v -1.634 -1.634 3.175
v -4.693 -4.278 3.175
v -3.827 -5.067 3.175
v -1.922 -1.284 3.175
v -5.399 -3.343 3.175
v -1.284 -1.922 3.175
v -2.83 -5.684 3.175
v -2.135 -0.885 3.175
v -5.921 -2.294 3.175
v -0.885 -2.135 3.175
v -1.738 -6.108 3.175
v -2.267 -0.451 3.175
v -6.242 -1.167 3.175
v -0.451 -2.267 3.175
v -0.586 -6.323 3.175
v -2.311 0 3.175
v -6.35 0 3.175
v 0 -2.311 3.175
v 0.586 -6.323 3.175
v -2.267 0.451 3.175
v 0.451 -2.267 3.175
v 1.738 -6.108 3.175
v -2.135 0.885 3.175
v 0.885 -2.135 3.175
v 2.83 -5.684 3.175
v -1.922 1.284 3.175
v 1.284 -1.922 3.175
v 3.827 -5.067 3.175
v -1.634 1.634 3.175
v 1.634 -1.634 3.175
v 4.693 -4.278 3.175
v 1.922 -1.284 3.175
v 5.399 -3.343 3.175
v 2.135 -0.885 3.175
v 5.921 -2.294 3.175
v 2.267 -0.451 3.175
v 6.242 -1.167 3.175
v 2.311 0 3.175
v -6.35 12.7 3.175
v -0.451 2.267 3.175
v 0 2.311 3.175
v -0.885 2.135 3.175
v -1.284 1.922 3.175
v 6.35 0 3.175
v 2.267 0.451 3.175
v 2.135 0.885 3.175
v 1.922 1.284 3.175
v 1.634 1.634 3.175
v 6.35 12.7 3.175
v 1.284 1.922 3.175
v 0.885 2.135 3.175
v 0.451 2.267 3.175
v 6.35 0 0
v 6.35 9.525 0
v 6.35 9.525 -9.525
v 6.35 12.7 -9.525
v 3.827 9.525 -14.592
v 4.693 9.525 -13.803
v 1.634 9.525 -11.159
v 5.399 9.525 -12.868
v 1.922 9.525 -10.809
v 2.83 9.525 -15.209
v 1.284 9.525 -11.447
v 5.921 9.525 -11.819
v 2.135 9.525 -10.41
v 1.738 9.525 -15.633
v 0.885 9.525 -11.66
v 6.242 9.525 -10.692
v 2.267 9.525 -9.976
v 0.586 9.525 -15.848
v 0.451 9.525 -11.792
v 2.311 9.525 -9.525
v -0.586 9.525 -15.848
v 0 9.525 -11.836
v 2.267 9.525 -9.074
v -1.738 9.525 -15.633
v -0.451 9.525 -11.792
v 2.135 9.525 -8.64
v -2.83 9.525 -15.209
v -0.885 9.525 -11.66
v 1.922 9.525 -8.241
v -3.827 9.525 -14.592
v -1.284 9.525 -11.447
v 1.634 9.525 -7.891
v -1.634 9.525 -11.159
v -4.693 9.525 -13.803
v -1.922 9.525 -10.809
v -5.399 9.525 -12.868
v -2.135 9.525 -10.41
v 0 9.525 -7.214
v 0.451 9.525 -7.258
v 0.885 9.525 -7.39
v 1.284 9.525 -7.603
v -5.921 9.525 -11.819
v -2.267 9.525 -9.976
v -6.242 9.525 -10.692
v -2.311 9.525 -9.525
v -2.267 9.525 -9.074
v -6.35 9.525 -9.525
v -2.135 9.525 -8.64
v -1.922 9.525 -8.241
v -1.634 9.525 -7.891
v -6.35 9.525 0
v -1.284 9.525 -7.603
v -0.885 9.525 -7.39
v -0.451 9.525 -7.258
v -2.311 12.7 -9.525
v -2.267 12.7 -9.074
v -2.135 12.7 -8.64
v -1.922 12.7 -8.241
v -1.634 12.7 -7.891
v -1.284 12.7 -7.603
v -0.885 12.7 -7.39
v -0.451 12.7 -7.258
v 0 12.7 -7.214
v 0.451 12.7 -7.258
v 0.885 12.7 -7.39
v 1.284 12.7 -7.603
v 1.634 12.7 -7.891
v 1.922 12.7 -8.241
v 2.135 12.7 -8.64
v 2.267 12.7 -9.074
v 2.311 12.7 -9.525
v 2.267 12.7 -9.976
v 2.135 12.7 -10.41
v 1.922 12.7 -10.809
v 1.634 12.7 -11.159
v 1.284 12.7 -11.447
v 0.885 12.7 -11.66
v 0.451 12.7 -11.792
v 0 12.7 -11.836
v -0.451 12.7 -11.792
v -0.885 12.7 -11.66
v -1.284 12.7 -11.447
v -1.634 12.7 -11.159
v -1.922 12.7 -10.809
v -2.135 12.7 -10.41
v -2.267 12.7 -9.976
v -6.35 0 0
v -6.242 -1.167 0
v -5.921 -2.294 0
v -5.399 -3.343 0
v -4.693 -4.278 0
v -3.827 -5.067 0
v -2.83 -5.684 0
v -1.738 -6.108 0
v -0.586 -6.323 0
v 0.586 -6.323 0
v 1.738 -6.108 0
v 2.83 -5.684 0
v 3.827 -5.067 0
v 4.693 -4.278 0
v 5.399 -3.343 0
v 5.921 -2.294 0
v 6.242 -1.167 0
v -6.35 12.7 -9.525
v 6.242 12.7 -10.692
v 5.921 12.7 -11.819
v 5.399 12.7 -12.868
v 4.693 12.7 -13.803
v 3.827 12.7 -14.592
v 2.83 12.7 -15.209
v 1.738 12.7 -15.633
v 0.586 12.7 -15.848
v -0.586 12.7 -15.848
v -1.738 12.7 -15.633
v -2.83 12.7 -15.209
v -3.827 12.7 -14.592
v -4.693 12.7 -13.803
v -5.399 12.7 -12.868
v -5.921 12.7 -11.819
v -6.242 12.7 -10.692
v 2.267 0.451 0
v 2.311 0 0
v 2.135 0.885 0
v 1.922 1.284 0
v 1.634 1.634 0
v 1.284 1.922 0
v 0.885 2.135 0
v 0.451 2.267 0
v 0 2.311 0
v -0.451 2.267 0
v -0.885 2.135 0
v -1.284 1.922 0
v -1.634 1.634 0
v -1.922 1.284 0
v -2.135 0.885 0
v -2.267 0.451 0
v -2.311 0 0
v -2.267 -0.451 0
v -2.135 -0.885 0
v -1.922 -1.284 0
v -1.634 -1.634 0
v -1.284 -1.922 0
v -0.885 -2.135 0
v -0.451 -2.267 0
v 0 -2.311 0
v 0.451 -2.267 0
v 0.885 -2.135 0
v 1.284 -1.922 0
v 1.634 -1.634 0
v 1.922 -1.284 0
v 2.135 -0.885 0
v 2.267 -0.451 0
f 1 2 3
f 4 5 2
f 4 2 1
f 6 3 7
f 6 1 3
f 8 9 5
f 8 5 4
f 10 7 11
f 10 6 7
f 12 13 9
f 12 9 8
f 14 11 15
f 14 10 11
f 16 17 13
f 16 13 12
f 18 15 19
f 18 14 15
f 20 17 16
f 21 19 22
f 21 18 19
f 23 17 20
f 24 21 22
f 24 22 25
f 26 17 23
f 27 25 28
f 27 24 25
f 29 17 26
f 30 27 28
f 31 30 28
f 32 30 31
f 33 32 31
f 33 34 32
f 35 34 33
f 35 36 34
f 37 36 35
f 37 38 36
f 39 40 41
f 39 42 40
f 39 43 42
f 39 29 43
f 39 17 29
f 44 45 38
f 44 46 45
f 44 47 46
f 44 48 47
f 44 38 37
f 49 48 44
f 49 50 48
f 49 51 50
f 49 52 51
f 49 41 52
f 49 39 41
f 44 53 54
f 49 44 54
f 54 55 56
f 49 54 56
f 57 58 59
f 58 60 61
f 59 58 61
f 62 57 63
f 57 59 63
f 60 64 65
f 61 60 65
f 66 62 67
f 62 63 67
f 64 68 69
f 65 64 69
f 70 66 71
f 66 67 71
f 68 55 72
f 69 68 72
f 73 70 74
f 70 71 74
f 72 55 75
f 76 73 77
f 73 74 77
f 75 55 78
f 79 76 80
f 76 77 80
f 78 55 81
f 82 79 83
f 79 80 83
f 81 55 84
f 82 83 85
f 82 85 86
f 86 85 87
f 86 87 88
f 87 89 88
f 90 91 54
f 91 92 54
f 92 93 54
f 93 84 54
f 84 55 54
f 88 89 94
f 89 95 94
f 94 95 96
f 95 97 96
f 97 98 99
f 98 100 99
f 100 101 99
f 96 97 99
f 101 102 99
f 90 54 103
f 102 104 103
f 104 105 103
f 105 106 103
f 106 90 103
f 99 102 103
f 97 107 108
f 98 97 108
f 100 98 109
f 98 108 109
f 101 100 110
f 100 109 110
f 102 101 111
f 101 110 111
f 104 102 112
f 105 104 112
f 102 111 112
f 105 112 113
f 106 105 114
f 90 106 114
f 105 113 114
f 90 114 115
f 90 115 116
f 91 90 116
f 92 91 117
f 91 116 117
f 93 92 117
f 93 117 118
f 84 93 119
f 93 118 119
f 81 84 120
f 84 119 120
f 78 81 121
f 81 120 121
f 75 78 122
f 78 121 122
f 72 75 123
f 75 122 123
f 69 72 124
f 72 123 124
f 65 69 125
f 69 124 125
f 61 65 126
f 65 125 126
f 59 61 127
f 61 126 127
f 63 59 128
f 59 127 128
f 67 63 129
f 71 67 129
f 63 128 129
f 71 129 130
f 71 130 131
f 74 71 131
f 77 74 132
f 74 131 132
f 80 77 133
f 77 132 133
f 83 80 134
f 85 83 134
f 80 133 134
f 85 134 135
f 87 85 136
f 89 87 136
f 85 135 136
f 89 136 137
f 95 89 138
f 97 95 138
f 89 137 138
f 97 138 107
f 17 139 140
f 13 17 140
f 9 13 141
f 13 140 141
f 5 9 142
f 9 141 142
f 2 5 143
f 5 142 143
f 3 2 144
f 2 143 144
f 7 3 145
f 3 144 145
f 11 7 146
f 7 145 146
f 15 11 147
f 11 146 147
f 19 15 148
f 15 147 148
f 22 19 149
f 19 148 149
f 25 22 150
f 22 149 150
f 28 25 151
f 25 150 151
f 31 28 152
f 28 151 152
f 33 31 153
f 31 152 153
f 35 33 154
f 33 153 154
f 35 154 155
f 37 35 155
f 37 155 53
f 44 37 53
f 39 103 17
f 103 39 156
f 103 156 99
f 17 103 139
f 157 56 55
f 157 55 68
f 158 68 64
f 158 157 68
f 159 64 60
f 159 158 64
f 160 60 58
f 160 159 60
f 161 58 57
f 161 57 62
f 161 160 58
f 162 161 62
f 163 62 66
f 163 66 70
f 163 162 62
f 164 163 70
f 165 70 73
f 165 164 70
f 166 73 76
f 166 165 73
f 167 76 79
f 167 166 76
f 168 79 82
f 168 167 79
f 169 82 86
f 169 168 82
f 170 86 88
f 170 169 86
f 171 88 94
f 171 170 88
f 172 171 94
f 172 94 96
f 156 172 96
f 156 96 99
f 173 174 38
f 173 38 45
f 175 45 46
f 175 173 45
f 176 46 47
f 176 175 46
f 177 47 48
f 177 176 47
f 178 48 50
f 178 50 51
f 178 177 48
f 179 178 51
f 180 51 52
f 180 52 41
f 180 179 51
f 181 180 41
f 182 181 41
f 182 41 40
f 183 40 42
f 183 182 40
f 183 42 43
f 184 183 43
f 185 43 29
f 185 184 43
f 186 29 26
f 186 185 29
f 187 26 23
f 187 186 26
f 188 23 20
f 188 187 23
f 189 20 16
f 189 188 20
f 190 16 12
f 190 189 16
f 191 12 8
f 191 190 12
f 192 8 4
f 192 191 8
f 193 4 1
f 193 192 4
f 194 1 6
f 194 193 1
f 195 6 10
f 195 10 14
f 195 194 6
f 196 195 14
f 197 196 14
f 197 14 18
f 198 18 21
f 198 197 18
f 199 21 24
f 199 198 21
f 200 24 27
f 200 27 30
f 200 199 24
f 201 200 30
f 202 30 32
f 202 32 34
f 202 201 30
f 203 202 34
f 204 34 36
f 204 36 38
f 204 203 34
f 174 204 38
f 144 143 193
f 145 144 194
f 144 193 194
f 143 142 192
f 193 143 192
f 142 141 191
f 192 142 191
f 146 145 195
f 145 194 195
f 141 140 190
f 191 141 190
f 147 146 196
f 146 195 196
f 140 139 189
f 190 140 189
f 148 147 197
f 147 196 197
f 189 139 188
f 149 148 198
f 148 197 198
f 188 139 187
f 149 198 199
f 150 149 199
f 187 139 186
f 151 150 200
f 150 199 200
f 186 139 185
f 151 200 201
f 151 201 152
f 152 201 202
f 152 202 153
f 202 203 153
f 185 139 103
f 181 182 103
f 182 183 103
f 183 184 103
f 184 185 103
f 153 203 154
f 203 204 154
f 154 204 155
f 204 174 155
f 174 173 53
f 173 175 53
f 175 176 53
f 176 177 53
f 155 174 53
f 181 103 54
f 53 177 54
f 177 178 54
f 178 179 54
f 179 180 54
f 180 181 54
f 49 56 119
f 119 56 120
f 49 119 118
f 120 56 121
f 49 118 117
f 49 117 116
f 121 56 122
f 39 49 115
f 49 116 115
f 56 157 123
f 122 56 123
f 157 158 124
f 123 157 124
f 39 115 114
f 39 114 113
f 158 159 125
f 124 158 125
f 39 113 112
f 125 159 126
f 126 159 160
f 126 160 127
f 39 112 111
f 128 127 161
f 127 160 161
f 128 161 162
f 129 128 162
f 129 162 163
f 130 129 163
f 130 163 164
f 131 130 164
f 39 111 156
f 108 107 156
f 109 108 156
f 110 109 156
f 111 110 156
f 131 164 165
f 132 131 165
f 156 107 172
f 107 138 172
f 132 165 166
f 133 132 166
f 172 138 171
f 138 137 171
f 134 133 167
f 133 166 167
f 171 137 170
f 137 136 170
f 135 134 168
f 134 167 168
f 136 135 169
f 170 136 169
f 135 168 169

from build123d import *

# Parameters (mm, degrees)
F0_R     = 2.3114
F1_DEPTH = 3.175
F2_R     = 2.3114
F3_DEPTH = 3.175


with BuildPart() as f1:
    # F0 (on Top) → F1 (new body)
    with BuildSketch(Plane.XY):
        with BuildLine():
            Line((-6.35, 12.7), (-6.35, 0))
            ThreePointArc((-6.35, 0), (0, -6.35), (6.35, 0))
            Line((6.35, 0), (6.35, 12.7))
            Line((6.35, 12.7), (-6.35, 12.7))
        make_face()
        Circle(F0_R, mode=Mode.SUBTRACT)
    extrude(amount=F1_DEPTH)

    # F2 (on face) → F3 (join)
    with BuildSketch(Plane(origin=(0, 12.7, 0), x_dir=(-1, 0, 0), z_dir=(0, 1, 0))):
        with BuildLine():
            Line((-6.35, 3.175), (-6.35, -9.525))
            ThreePointArc((-6.35, -9.525), (0, -15.875), (6.35, -9.525))
            Line((6.35, -9.525), (6.35, 3.175))
            Line((6.35, 3.175), (-6.35, 3.175))
        make_face()
        with Locations((0, -9.525)):
            Circle(F2_R, mode=Mode.SUBTRACT)
    extrude(amount=-F3_DEPTH)


solid = f1.part
